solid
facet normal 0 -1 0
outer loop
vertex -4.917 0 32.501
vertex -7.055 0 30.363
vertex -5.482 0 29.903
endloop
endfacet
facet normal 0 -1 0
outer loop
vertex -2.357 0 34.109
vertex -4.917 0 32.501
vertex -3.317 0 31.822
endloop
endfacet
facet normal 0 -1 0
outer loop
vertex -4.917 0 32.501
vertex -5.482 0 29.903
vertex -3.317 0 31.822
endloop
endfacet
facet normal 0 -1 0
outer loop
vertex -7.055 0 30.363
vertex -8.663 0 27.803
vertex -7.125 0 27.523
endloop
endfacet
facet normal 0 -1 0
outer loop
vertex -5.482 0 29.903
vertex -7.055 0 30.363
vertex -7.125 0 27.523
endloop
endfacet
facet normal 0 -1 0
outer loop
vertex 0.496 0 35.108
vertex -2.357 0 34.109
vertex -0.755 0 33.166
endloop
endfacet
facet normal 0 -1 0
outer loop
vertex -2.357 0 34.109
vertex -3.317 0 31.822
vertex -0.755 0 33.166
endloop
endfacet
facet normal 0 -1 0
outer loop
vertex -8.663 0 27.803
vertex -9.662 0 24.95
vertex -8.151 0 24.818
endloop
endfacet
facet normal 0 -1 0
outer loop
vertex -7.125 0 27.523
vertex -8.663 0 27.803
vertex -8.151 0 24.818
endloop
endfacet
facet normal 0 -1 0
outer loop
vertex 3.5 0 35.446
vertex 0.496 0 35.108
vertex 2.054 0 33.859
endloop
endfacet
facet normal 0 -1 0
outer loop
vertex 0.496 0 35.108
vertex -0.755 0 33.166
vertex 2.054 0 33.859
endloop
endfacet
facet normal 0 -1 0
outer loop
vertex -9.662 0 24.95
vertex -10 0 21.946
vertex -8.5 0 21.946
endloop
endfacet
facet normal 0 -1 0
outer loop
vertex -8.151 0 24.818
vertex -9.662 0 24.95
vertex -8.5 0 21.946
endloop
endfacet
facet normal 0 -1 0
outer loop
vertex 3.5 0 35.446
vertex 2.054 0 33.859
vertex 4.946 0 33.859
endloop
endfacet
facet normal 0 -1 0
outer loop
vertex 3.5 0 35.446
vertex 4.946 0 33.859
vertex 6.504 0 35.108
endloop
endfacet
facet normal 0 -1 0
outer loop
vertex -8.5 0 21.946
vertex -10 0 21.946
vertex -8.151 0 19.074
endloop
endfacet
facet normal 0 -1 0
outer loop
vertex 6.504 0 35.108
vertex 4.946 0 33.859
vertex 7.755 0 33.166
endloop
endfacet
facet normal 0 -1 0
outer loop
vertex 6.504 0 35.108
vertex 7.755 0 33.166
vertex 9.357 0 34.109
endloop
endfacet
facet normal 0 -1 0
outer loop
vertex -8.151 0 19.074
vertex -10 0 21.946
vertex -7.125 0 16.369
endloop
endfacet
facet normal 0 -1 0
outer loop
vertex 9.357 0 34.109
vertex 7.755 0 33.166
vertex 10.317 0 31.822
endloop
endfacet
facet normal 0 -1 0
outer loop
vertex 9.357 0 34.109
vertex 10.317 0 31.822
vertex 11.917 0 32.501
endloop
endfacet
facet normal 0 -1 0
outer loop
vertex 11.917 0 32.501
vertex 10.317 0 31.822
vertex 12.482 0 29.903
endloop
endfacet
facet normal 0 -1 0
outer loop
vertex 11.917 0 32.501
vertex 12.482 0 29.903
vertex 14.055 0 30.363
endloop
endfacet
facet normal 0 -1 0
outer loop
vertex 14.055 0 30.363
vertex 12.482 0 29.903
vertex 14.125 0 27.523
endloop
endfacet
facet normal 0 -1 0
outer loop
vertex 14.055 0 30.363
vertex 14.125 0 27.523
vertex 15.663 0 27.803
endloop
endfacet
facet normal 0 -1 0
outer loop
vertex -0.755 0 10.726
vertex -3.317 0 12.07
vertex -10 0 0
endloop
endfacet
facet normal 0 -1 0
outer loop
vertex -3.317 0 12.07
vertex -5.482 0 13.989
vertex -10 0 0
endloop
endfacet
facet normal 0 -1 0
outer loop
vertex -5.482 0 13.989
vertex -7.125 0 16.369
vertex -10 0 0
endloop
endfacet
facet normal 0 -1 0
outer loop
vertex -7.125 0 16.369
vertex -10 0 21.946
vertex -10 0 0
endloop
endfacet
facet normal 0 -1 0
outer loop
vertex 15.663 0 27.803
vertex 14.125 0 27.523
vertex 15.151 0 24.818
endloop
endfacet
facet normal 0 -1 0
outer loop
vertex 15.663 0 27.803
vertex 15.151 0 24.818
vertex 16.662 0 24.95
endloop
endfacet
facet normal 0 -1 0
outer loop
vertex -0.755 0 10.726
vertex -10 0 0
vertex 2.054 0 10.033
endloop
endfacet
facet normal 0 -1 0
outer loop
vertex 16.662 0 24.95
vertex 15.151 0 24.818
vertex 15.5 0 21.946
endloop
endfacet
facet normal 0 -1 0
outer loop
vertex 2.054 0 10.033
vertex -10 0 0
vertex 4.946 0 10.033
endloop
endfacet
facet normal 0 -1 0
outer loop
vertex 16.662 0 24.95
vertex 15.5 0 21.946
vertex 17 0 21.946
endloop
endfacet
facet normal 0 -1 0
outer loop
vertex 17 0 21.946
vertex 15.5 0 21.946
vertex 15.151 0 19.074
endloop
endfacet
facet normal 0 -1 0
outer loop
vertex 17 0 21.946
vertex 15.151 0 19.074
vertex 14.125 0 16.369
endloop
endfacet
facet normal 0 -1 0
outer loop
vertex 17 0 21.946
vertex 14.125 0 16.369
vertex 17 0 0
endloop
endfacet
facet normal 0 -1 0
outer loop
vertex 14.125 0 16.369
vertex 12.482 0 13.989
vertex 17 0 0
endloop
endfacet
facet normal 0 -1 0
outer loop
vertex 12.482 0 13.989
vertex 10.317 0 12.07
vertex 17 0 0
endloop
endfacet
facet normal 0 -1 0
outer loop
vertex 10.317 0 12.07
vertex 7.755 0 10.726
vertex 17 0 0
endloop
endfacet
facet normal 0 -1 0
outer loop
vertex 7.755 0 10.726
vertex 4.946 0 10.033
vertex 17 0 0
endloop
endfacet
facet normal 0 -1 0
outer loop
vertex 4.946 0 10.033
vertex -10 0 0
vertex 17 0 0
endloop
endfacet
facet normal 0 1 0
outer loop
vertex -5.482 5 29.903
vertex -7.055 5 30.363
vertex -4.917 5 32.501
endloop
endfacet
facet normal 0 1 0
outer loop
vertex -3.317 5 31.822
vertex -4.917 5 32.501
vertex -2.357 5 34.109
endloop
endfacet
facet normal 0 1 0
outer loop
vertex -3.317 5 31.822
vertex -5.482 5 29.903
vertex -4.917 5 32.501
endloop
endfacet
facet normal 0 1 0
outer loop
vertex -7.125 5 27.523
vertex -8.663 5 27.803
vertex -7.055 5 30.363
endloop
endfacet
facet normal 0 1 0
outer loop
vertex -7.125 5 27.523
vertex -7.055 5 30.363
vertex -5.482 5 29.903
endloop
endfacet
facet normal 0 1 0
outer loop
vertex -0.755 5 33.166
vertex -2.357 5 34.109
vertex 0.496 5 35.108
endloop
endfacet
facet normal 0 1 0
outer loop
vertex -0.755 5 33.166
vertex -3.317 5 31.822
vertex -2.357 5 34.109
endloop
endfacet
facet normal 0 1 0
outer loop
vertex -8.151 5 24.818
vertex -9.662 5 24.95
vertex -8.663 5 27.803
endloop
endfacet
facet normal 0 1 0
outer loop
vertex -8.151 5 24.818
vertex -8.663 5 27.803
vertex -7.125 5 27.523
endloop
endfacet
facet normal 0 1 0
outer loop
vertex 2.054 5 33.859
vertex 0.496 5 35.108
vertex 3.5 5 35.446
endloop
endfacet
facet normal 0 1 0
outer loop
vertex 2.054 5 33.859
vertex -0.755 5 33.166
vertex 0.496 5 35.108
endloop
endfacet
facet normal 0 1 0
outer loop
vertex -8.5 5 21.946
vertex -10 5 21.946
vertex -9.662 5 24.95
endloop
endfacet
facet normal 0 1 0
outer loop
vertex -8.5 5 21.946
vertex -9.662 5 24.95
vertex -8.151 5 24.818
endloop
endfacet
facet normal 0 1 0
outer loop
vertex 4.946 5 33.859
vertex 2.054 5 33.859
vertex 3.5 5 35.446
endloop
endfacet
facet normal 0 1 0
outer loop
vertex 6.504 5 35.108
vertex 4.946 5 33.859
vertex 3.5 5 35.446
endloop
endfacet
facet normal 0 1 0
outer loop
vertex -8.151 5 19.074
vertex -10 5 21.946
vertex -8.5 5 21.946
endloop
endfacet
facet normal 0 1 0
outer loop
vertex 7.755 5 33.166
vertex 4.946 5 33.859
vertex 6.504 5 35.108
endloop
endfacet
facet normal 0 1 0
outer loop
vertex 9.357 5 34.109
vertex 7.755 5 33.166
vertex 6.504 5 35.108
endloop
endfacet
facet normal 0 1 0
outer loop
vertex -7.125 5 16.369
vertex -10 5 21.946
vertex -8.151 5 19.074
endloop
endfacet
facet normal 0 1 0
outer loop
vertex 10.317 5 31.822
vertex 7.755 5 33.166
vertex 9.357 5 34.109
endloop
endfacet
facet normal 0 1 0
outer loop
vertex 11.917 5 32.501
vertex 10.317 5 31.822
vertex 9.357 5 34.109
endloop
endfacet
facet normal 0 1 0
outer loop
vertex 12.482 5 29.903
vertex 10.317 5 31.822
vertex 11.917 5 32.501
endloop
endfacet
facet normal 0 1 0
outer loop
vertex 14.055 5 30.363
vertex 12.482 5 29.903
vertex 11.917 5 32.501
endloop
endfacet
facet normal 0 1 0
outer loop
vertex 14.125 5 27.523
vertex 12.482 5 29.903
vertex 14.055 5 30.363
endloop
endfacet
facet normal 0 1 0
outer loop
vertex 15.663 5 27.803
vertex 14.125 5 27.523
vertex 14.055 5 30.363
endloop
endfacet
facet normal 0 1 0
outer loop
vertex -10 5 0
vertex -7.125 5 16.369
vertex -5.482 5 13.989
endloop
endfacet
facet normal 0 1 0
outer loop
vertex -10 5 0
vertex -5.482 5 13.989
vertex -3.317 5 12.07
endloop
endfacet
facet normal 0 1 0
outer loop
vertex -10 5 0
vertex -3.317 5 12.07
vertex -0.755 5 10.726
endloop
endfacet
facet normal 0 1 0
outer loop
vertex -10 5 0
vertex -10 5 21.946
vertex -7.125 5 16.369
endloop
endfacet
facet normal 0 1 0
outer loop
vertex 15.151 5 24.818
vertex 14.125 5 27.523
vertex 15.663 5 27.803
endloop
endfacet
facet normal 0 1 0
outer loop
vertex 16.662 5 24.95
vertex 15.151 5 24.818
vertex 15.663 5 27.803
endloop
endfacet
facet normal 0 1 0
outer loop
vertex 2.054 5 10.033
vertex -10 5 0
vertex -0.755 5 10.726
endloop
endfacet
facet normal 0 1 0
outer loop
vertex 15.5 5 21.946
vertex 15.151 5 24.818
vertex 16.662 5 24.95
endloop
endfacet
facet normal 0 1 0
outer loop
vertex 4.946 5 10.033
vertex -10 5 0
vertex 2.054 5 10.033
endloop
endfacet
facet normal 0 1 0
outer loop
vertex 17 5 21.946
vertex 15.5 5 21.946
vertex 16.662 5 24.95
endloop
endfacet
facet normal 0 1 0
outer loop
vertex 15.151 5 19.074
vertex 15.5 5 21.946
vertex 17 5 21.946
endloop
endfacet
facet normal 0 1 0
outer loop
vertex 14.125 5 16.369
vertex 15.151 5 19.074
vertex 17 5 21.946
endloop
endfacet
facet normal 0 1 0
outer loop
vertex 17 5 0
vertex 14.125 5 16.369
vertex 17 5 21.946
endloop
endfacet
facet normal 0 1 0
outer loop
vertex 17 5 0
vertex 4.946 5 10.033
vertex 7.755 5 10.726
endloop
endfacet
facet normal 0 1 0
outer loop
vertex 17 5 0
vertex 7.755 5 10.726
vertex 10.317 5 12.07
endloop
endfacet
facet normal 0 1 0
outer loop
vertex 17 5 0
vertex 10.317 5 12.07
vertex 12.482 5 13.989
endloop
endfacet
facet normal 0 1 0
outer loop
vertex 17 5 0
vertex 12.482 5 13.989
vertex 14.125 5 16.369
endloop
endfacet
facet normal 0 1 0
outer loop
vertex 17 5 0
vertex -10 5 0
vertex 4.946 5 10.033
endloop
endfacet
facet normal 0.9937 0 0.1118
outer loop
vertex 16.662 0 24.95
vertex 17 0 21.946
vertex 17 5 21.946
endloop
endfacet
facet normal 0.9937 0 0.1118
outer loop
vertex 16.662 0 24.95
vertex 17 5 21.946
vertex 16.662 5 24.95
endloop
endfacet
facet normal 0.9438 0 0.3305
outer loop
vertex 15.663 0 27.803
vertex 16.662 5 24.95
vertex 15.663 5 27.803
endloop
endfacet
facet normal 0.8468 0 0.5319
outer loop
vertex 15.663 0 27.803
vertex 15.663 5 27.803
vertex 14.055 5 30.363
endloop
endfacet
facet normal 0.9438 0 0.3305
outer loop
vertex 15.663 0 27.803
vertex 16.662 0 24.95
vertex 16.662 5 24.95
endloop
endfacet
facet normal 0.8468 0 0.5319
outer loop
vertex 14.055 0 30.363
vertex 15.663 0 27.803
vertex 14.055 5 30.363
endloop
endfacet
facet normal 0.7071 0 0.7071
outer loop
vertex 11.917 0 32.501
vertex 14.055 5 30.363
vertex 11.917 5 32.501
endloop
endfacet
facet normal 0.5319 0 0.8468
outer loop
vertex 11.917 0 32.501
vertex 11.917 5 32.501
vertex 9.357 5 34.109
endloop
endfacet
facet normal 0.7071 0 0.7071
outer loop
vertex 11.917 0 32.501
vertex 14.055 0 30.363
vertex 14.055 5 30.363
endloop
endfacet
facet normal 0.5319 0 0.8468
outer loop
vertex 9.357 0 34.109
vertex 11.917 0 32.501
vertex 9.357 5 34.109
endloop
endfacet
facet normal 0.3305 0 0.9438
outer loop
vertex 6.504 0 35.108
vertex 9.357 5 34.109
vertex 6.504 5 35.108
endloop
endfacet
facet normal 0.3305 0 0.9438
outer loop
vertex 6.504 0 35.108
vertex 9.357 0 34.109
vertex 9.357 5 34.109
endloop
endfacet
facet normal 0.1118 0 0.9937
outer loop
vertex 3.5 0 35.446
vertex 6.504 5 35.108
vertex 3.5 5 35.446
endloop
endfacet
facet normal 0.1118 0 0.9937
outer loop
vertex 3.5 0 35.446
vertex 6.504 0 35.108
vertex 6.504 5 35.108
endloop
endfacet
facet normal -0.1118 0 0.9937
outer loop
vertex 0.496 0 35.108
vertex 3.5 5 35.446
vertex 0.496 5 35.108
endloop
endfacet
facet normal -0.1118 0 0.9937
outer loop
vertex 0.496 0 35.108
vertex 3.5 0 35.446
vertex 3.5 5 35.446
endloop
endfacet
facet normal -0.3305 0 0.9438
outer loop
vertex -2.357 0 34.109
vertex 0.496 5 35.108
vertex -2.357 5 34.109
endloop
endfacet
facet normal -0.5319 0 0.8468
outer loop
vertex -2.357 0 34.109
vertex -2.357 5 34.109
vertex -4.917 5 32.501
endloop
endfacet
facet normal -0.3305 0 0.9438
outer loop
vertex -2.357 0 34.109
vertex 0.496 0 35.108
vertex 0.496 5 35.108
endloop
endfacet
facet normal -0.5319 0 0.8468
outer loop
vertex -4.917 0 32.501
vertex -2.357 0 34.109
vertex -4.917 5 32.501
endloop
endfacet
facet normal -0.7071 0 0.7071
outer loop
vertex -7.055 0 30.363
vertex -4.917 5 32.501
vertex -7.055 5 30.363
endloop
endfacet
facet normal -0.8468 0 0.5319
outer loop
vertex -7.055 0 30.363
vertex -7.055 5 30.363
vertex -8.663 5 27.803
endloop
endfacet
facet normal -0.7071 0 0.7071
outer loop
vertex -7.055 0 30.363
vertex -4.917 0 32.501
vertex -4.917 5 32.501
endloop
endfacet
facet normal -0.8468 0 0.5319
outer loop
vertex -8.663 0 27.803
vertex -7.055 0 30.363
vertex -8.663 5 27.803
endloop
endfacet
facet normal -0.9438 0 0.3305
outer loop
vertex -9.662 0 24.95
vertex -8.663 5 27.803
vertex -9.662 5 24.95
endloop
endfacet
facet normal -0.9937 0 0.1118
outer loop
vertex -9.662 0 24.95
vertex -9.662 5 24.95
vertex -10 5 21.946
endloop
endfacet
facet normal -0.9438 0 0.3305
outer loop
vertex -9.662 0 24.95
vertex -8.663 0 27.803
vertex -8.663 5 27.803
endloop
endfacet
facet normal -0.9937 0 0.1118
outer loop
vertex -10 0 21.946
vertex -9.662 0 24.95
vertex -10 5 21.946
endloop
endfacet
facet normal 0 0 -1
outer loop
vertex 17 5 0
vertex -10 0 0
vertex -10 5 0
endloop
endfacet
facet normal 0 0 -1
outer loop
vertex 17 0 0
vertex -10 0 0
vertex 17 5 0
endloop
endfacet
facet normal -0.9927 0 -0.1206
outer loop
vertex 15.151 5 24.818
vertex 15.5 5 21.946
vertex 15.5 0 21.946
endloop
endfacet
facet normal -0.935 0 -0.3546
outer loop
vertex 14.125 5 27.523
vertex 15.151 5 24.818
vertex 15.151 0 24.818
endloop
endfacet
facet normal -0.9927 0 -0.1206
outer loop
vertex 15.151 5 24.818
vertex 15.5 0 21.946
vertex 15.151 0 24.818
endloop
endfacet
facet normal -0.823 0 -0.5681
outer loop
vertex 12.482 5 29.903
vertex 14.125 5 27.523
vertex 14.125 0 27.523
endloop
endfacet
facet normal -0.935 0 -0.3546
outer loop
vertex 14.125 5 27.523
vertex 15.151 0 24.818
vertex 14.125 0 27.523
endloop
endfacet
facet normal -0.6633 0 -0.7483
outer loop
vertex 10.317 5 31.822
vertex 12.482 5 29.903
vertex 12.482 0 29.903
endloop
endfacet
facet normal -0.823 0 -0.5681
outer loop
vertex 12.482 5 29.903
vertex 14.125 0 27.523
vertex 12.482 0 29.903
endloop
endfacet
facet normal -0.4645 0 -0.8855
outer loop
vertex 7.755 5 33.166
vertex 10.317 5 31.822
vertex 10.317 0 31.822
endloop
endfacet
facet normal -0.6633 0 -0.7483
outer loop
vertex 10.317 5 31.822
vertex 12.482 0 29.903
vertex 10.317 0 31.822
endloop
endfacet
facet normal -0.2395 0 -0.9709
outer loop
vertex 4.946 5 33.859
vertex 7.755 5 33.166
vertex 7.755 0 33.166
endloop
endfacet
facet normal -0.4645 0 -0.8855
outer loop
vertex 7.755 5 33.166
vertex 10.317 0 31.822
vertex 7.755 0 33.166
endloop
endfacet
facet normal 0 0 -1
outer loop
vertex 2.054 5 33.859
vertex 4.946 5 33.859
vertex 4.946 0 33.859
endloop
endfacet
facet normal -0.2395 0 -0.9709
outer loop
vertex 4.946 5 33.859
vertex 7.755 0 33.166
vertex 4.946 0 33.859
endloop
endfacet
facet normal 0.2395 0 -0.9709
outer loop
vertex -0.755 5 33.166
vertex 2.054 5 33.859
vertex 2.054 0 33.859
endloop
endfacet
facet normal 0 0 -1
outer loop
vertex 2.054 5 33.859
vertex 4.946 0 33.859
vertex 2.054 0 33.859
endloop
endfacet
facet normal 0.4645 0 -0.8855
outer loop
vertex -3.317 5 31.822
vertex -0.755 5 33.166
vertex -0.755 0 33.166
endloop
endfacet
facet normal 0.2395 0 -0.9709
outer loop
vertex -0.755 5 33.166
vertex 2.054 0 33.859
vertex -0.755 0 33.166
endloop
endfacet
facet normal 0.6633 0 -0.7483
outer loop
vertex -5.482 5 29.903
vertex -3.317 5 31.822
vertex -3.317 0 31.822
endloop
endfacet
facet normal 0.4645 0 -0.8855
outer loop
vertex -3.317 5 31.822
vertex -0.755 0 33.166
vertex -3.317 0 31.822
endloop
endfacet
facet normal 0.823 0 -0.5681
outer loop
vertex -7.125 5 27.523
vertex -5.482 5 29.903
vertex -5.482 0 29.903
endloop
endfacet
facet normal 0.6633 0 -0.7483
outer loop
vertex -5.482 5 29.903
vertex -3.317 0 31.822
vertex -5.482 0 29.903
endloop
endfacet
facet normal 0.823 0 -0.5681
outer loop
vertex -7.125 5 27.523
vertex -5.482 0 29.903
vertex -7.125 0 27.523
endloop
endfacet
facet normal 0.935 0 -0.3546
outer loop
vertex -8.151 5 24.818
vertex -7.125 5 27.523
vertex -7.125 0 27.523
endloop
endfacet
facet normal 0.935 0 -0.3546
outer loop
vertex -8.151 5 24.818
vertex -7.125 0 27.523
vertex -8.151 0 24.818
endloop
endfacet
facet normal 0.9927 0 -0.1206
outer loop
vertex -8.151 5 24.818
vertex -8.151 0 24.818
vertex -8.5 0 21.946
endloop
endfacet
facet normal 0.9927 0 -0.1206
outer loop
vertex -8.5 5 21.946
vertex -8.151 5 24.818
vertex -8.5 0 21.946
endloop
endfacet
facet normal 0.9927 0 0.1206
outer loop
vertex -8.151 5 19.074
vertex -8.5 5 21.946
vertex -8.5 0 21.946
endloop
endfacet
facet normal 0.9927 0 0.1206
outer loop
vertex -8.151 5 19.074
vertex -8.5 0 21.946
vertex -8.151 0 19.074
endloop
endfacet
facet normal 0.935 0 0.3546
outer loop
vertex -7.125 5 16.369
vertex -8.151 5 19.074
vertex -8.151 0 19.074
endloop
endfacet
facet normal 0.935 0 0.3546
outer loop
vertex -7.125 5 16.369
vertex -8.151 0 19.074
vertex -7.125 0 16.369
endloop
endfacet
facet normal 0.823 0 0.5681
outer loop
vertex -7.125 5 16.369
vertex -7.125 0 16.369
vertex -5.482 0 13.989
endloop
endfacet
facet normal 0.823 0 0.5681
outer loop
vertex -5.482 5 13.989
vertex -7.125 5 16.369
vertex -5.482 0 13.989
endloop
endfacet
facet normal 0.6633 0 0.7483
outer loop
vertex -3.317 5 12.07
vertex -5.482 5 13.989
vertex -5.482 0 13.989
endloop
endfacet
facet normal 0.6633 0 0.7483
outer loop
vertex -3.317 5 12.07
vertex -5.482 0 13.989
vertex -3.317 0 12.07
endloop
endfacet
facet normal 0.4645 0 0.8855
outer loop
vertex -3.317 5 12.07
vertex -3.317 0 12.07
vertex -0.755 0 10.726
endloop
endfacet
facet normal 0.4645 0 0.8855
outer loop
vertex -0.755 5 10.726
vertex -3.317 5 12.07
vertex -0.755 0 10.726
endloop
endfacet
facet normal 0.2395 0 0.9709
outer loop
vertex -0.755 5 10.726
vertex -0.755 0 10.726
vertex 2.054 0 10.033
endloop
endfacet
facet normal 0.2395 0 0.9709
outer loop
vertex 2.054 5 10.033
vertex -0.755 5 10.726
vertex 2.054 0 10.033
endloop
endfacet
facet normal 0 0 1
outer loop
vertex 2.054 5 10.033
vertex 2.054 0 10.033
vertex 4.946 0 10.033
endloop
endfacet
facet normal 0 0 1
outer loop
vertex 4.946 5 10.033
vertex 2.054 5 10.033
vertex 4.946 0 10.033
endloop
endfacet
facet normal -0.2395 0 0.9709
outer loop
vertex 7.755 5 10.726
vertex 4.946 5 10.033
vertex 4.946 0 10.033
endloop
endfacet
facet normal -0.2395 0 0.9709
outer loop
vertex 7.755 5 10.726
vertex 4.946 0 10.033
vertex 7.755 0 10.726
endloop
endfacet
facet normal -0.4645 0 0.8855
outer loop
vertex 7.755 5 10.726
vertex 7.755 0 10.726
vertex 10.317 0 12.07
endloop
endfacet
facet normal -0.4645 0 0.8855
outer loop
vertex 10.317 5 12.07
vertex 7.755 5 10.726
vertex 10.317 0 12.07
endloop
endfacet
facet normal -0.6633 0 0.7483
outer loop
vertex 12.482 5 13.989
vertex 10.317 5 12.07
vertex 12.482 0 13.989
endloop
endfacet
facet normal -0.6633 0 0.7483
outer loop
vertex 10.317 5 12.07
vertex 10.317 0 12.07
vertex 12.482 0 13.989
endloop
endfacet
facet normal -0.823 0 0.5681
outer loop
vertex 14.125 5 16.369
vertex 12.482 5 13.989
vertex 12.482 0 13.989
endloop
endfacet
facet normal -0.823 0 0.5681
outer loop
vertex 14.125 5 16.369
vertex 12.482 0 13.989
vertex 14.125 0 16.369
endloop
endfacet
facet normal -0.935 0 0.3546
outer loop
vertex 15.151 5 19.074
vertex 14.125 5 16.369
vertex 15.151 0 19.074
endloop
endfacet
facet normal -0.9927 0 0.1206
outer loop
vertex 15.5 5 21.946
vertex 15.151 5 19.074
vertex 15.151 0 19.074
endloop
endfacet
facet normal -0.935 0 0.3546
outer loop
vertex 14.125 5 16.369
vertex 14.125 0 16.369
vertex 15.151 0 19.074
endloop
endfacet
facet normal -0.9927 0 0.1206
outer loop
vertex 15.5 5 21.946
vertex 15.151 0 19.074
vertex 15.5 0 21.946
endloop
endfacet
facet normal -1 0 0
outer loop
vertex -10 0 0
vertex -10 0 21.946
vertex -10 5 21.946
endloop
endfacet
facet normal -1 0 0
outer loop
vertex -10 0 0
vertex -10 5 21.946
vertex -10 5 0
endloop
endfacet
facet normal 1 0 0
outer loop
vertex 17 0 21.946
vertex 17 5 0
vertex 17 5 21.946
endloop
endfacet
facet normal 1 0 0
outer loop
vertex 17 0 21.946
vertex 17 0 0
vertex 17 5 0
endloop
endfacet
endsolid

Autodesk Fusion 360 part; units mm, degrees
sketch "Sketch1" plane through (0, 0, 0) normal (0, 1, 0) x (1, 0, 0)
  line L0 (-10, 0) -> (17, 0)
  line L1 (17, 0) -> (17, -21.946)
  line L2 (17, -21.946) -> (-10, -21.946)
  line L3 (-10, -21.946) -> (-10, 0)
  dimension "d1" = 21.946
  dimension "d2" = 27
  dimension "d3" = 10
  dimension "d4" = 21.946
extrude "Extrude1" add sketch "Sketch1" along normal blind 5
sketch "Sketch2" plane through (0, 0, 0) normal (0, -1, 0) x (1, 0, 0)
  line L0 (17, 21.946) -> (-10, 21.946)
  line L1 (-10, 21.946) -> (-10, 0)
  line L2 (-10, 0) -> (17, 0)
  line L3 (17, 0) -> (17, 21.946)
  circle A0 centre (3.5, 21.946) radius 13.5
  circle A1 centre (3.5, 21.946) radius 12
  dimension "d7" = 27
  dimension "d8" = 24
extrude "Extrude2" add sketch "Sketch2" against normal blind 5 contours L0 A0 A1 picked at (13.449, 30.2624)
extrude "Extrude3" cut sketch "Sketch2" against normal blind 5 contours L0 A1 picked at (6.689, 16.5654)
equation "d1 = 21.616 mm + 0.33 mm"
equation "d4 = 21.616 mm + 0.33 mm"
